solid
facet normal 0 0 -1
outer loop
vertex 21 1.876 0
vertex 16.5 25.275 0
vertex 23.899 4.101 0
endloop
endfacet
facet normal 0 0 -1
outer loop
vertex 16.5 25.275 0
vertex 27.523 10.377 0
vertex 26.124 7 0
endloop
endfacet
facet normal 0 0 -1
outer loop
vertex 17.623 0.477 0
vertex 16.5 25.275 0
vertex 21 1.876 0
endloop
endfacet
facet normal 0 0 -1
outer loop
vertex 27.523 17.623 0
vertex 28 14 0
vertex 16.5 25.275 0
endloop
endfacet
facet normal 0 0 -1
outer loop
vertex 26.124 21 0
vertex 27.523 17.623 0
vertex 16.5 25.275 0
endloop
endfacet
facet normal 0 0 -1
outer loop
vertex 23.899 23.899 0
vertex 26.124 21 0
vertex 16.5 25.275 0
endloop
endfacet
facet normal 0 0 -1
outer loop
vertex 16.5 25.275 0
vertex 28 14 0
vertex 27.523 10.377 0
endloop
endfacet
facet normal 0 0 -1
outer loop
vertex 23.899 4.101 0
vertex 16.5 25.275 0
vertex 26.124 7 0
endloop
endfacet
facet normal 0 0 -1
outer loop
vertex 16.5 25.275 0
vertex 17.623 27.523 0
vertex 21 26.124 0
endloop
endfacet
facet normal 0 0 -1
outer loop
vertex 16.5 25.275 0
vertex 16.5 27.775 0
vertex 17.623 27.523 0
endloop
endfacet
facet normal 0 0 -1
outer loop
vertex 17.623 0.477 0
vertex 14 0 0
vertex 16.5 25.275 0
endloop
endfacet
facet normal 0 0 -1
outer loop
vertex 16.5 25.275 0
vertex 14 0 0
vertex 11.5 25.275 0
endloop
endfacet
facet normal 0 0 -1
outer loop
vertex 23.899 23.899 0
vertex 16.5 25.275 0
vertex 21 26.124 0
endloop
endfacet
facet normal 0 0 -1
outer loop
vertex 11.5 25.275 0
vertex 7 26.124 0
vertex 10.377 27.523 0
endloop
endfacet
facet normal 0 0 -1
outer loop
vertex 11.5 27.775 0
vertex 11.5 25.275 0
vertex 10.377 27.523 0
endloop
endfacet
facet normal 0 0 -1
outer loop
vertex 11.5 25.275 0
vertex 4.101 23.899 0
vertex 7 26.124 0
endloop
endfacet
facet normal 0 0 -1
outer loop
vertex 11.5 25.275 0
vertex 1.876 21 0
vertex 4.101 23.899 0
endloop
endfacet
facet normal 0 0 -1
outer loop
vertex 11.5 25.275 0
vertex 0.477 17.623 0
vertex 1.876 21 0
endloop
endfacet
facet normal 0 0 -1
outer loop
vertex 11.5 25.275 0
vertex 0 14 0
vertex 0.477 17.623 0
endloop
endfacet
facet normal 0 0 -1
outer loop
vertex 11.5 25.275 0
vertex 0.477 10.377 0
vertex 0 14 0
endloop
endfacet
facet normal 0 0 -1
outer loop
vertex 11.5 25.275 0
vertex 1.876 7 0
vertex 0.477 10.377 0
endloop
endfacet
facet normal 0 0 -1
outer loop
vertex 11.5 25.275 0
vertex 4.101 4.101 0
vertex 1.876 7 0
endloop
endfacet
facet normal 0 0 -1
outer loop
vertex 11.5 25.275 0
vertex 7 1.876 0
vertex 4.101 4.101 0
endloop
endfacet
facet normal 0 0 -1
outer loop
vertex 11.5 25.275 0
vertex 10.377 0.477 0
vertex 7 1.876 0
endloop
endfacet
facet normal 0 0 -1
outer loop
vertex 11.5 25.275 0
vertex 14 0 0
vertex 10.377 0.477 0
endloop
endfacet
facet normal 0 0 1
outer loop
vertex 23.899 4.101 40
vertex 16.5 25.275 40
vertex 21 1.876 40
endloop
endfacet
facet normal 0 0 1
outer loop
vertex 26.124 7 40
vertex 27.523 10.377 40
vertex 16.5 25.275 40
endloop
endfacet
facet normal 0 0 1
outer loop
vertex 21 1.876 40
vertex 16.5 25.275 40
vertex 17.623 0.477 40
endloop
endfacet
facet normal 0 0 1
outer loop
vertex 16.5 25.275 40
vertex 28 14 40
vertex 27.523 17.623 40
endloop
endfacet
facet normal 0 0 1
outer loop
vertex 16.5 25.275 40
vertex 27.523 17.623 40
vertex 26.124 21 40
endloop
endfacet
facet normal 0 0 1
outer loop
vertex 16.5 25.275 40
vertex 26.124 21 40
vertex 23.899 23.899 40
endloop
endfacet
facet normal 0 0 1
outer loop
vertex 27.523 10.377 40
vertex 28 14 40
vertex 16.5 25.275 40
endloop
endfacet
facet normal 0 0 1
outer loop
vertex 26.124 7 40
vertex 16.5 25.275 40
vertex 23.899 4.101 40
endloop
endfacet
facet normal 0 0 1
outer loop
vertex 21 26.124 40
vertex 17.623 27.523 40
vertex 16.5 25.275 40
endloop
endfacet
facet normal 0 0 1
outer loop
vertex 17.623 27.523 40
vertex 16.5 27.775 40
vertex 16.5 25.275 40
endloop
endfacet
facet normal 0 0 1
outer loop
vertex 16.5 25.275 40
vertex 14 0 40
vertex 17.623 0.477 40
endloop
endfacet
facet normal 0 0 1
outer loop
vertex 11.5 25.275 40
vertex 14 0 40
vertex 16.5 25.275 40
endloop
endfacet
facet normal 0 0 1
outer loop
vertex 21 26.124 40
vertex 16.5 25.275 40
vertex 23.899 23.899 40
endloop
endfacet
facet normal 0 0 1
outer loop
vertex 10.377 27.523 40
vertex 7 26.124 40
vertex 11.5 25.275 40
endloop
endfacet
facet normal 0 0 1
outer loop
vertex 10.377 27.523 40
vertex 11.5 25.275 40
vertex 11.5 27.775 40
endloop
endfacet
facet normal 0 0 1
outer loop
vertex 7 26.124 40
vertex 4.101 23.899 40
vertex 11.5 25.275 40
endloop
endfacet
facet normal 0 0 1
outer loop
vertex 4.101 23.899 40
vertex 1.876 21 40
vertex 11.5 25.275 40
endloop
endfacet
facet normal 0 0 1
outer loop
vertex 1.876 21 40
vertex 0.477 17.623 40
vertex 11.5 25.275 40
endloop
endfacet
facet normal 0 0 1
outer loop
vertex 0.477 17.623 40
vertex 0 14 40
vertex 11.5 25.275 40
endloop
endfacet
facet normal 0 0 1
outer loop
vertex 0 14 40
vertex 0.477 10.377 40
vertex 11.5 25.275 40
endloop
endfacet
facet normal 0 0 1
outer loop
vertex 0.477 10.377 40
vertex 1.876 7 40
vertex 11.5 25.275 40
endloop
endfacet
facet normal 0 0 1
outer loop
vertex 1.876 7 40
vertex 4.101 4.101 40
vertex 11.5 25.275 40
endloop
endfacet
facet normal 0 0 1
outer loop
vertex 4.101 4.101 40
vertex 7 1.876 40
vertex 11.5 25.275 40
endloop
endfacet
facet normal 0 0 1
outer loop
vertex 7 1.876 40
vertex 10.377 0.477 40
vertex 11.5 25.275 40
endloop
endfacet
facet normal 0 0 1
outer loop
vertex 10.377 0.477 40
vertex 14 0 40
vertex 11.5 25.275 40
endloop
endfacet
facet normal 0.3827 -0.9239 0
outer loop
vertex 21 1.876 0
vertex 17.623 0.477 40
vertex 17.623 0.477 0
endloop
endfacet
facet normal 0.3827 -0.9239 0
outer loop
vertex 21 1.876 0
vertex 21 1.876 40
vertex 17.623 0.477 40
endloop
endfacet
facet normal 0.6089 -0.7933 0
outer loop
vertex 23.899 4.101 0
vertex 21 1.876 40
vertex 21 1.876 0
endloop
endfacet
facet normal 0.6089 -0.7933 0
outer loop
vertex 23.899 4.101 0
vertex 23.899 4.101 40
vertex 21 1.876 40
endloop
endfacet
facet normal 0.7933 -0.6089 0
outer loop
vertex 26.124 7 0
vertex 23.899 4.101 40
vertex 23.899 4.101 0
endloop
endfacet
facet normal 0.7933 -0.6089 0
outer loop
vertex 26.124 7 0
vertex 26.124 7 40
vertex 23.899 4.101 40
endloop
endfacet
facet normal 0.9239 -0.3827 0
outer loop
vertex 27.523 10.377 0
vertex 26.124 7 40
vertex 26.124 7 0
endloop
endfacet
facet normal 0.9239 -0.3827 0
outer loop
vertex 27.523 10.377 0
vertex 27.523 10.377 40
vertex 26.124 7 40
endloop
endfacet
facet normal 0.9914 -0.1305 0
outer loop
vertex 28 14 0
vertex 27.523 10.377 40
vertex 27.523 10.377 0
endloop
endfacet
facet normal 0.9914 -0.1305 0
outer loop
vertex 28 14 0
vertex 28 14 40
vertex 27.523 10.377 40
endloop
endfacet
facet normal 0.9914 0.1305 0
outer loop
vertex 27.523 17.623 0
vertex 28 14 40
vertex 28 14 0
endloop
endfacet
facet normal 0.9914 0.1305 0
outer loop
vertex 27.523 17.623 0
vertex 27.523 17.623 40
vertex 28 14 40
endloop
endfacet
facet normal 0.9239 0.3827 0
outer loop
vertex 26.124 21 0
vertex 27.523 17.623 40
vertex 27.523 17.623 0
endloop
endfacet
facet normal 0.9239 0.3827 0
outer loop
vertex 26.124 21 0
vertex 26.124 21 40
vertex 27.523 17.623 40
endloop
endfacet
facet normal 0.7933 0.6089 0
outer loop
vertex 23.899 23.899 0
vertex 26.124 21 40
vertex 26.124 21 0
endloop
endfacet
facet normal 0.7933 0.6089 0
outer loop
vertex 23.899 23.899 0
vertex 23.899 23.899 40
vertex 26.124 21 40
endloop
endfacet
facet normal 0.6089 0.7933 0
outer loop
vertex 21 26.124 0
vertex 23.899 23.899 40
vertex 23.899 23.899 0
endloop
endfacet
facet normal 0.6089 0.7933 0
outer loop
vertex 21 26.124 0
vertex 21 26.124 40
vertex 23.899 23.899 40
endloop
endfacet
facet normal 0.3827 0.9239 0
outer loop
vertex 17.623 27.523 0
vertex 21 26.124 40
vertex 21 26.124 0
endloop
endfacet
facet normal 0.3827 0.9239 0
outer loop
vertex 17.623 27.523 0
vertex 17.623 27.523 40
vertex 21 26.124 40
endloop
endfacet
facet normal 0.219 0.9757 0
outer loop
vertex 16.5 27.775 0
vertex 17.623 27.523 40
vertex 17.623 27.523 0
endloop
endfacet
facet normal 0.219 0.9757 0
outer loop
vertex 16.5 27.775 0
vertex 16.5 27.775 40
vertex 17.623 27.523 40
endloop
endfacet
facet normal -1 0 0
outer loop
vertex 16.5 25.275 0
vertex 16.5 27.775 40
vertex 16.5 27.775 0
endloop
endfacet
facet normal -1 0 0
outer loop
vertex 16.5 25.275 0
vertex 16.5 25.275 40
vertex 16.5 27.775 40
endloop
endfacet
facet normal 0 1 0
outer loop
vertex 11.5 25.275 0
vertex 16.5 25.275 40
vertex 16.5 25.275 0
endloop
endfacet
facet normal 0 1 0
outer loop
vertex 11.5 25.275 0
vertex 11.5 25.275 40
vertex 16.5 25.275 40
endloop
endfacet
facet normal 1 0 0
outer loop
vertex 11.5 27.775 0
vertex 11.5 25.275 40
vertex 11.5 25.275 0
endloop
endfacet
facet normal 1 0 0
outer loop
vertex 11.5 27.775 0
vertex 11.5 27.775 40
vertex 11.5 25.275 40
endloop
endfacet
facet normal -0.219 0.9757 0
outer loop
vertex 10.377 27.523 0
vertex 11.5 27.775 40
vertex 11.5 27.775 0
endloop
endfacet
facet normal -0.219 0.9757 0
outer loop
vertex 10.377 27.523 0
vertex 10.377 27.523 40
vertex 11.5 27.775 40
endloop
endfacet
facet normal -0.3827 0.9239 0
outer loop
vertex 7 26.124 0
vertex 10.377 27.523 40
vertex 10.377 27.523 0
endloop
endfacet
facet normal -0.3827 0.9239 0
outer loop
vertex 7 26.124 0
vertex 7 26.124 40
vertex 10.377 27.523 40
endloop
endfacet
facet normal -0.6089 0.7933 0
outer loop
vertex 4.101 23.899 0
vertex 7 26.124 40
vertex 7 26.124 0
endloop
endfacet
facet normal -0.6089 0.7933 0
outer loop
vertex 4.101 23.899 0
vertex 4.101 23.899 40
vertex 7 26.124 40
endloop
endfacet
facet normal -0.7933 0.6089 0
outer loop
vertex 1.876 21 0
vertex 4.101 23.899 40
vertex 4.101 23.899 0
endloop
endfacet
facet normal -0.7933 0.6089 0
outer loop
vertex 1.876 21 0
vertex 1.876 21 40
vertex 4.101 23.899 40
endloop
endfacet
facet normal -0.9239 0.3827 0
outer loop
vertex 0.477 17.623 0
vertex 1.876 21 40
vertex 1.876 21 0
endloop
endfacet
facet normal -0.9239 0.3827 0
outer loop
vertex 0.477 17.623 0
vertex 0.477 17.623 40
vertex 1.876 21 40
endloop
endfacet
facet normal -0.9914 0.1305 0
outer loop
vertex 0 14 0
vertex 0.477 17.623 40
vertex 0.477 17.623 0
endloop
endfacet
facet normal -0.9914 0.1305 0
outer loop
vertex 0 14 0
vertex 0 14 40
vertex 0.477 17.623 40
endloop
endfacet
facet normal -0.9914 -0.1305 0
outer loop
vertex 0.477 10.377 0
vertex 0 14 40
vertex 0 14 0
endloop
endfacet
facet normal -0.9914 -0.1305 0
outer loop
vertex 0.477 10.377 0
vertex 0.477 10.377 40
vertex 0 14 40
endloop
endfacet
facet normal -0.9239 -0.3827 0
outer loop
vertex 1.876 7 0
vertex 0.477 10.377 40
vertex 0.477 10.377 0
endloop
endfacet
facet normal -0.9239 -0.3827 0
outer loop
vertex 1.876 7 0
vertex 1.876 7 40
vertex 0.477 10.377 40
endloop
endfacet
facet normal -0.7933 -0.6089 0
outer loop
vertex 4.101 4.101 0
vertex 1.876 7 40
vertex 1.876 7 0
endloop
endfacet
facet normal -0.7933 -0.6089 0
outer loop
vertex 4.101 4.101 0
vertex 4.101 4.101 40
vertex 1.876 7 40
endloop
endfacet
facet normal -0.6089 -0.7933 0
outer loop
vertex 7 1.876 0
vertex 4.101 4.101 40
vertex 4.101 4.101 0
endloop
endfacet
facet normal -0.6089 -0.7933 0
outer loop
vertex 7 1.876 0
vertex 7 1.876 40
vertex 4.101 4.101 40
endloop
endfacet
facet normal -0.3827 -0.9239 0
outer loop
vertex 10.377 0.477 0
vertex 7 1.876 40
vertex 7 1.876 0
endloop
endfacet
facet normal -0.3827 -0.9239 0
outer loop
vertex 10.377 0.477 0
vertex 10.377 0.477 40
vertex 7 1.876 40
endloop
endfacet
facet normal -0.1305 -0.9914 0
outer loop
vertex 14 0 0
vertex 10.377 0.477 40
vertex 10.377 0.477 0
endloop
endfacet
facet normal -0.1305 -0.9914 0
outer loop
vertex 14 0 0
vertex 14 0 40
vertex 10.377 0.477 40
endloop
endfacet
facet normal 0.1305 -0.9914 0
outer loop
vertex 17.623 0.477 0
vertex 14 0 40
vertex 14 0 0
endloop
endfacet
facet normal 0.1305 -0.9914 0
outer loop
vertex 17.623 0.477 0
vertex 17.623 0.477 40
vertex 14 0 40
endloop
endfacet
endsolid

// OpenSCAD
$fn = 32;

// ----------------------------------------------------------------------
// Keyway shaft: d28 shaft, key 5 x 2.5 mm
// ----------------------------------------------------------------------

// --- parameters (mm) ---
shaft_r = 14;             // shaft radius
key_w = 5;                // keyway width
key_d = 2.5;              // keyway depth below the surface line
plate_t = 40;             // shaft length, Z (extrusion height)

shaft_d = 2 * shaft_r;  // shaft diameter
circle_step = 15;  // polygon sampling step, degrees

profile = [[10.377, 27.523], [7, 26.124], [4.101, 23.899], [1.876, 21], [0.477, 17.623], [0, 14], [0.477, 10.377], [1.876, 7], [4.101, 4.101], [7, 1.876], [10.377, 0.477], [14, 0], [17.623, 0.477], [21, 1.876], [23.899, 4.101], [26.124, 7], [27.523, 10.377], [28, 14], [27.523, 17.623], [26.124, 21], [23.899, 23.899], [21, 26.124], [17.623, 27.523], [16.5, 27.775], [16.5, 25.275], [11.5, 25.275], [11.5, 27.775]];  // primary outline, 27 points, counter clockwise

// --- the one profile operation ---
linear_extrude(height = plate_t) polygon(points = profile);
